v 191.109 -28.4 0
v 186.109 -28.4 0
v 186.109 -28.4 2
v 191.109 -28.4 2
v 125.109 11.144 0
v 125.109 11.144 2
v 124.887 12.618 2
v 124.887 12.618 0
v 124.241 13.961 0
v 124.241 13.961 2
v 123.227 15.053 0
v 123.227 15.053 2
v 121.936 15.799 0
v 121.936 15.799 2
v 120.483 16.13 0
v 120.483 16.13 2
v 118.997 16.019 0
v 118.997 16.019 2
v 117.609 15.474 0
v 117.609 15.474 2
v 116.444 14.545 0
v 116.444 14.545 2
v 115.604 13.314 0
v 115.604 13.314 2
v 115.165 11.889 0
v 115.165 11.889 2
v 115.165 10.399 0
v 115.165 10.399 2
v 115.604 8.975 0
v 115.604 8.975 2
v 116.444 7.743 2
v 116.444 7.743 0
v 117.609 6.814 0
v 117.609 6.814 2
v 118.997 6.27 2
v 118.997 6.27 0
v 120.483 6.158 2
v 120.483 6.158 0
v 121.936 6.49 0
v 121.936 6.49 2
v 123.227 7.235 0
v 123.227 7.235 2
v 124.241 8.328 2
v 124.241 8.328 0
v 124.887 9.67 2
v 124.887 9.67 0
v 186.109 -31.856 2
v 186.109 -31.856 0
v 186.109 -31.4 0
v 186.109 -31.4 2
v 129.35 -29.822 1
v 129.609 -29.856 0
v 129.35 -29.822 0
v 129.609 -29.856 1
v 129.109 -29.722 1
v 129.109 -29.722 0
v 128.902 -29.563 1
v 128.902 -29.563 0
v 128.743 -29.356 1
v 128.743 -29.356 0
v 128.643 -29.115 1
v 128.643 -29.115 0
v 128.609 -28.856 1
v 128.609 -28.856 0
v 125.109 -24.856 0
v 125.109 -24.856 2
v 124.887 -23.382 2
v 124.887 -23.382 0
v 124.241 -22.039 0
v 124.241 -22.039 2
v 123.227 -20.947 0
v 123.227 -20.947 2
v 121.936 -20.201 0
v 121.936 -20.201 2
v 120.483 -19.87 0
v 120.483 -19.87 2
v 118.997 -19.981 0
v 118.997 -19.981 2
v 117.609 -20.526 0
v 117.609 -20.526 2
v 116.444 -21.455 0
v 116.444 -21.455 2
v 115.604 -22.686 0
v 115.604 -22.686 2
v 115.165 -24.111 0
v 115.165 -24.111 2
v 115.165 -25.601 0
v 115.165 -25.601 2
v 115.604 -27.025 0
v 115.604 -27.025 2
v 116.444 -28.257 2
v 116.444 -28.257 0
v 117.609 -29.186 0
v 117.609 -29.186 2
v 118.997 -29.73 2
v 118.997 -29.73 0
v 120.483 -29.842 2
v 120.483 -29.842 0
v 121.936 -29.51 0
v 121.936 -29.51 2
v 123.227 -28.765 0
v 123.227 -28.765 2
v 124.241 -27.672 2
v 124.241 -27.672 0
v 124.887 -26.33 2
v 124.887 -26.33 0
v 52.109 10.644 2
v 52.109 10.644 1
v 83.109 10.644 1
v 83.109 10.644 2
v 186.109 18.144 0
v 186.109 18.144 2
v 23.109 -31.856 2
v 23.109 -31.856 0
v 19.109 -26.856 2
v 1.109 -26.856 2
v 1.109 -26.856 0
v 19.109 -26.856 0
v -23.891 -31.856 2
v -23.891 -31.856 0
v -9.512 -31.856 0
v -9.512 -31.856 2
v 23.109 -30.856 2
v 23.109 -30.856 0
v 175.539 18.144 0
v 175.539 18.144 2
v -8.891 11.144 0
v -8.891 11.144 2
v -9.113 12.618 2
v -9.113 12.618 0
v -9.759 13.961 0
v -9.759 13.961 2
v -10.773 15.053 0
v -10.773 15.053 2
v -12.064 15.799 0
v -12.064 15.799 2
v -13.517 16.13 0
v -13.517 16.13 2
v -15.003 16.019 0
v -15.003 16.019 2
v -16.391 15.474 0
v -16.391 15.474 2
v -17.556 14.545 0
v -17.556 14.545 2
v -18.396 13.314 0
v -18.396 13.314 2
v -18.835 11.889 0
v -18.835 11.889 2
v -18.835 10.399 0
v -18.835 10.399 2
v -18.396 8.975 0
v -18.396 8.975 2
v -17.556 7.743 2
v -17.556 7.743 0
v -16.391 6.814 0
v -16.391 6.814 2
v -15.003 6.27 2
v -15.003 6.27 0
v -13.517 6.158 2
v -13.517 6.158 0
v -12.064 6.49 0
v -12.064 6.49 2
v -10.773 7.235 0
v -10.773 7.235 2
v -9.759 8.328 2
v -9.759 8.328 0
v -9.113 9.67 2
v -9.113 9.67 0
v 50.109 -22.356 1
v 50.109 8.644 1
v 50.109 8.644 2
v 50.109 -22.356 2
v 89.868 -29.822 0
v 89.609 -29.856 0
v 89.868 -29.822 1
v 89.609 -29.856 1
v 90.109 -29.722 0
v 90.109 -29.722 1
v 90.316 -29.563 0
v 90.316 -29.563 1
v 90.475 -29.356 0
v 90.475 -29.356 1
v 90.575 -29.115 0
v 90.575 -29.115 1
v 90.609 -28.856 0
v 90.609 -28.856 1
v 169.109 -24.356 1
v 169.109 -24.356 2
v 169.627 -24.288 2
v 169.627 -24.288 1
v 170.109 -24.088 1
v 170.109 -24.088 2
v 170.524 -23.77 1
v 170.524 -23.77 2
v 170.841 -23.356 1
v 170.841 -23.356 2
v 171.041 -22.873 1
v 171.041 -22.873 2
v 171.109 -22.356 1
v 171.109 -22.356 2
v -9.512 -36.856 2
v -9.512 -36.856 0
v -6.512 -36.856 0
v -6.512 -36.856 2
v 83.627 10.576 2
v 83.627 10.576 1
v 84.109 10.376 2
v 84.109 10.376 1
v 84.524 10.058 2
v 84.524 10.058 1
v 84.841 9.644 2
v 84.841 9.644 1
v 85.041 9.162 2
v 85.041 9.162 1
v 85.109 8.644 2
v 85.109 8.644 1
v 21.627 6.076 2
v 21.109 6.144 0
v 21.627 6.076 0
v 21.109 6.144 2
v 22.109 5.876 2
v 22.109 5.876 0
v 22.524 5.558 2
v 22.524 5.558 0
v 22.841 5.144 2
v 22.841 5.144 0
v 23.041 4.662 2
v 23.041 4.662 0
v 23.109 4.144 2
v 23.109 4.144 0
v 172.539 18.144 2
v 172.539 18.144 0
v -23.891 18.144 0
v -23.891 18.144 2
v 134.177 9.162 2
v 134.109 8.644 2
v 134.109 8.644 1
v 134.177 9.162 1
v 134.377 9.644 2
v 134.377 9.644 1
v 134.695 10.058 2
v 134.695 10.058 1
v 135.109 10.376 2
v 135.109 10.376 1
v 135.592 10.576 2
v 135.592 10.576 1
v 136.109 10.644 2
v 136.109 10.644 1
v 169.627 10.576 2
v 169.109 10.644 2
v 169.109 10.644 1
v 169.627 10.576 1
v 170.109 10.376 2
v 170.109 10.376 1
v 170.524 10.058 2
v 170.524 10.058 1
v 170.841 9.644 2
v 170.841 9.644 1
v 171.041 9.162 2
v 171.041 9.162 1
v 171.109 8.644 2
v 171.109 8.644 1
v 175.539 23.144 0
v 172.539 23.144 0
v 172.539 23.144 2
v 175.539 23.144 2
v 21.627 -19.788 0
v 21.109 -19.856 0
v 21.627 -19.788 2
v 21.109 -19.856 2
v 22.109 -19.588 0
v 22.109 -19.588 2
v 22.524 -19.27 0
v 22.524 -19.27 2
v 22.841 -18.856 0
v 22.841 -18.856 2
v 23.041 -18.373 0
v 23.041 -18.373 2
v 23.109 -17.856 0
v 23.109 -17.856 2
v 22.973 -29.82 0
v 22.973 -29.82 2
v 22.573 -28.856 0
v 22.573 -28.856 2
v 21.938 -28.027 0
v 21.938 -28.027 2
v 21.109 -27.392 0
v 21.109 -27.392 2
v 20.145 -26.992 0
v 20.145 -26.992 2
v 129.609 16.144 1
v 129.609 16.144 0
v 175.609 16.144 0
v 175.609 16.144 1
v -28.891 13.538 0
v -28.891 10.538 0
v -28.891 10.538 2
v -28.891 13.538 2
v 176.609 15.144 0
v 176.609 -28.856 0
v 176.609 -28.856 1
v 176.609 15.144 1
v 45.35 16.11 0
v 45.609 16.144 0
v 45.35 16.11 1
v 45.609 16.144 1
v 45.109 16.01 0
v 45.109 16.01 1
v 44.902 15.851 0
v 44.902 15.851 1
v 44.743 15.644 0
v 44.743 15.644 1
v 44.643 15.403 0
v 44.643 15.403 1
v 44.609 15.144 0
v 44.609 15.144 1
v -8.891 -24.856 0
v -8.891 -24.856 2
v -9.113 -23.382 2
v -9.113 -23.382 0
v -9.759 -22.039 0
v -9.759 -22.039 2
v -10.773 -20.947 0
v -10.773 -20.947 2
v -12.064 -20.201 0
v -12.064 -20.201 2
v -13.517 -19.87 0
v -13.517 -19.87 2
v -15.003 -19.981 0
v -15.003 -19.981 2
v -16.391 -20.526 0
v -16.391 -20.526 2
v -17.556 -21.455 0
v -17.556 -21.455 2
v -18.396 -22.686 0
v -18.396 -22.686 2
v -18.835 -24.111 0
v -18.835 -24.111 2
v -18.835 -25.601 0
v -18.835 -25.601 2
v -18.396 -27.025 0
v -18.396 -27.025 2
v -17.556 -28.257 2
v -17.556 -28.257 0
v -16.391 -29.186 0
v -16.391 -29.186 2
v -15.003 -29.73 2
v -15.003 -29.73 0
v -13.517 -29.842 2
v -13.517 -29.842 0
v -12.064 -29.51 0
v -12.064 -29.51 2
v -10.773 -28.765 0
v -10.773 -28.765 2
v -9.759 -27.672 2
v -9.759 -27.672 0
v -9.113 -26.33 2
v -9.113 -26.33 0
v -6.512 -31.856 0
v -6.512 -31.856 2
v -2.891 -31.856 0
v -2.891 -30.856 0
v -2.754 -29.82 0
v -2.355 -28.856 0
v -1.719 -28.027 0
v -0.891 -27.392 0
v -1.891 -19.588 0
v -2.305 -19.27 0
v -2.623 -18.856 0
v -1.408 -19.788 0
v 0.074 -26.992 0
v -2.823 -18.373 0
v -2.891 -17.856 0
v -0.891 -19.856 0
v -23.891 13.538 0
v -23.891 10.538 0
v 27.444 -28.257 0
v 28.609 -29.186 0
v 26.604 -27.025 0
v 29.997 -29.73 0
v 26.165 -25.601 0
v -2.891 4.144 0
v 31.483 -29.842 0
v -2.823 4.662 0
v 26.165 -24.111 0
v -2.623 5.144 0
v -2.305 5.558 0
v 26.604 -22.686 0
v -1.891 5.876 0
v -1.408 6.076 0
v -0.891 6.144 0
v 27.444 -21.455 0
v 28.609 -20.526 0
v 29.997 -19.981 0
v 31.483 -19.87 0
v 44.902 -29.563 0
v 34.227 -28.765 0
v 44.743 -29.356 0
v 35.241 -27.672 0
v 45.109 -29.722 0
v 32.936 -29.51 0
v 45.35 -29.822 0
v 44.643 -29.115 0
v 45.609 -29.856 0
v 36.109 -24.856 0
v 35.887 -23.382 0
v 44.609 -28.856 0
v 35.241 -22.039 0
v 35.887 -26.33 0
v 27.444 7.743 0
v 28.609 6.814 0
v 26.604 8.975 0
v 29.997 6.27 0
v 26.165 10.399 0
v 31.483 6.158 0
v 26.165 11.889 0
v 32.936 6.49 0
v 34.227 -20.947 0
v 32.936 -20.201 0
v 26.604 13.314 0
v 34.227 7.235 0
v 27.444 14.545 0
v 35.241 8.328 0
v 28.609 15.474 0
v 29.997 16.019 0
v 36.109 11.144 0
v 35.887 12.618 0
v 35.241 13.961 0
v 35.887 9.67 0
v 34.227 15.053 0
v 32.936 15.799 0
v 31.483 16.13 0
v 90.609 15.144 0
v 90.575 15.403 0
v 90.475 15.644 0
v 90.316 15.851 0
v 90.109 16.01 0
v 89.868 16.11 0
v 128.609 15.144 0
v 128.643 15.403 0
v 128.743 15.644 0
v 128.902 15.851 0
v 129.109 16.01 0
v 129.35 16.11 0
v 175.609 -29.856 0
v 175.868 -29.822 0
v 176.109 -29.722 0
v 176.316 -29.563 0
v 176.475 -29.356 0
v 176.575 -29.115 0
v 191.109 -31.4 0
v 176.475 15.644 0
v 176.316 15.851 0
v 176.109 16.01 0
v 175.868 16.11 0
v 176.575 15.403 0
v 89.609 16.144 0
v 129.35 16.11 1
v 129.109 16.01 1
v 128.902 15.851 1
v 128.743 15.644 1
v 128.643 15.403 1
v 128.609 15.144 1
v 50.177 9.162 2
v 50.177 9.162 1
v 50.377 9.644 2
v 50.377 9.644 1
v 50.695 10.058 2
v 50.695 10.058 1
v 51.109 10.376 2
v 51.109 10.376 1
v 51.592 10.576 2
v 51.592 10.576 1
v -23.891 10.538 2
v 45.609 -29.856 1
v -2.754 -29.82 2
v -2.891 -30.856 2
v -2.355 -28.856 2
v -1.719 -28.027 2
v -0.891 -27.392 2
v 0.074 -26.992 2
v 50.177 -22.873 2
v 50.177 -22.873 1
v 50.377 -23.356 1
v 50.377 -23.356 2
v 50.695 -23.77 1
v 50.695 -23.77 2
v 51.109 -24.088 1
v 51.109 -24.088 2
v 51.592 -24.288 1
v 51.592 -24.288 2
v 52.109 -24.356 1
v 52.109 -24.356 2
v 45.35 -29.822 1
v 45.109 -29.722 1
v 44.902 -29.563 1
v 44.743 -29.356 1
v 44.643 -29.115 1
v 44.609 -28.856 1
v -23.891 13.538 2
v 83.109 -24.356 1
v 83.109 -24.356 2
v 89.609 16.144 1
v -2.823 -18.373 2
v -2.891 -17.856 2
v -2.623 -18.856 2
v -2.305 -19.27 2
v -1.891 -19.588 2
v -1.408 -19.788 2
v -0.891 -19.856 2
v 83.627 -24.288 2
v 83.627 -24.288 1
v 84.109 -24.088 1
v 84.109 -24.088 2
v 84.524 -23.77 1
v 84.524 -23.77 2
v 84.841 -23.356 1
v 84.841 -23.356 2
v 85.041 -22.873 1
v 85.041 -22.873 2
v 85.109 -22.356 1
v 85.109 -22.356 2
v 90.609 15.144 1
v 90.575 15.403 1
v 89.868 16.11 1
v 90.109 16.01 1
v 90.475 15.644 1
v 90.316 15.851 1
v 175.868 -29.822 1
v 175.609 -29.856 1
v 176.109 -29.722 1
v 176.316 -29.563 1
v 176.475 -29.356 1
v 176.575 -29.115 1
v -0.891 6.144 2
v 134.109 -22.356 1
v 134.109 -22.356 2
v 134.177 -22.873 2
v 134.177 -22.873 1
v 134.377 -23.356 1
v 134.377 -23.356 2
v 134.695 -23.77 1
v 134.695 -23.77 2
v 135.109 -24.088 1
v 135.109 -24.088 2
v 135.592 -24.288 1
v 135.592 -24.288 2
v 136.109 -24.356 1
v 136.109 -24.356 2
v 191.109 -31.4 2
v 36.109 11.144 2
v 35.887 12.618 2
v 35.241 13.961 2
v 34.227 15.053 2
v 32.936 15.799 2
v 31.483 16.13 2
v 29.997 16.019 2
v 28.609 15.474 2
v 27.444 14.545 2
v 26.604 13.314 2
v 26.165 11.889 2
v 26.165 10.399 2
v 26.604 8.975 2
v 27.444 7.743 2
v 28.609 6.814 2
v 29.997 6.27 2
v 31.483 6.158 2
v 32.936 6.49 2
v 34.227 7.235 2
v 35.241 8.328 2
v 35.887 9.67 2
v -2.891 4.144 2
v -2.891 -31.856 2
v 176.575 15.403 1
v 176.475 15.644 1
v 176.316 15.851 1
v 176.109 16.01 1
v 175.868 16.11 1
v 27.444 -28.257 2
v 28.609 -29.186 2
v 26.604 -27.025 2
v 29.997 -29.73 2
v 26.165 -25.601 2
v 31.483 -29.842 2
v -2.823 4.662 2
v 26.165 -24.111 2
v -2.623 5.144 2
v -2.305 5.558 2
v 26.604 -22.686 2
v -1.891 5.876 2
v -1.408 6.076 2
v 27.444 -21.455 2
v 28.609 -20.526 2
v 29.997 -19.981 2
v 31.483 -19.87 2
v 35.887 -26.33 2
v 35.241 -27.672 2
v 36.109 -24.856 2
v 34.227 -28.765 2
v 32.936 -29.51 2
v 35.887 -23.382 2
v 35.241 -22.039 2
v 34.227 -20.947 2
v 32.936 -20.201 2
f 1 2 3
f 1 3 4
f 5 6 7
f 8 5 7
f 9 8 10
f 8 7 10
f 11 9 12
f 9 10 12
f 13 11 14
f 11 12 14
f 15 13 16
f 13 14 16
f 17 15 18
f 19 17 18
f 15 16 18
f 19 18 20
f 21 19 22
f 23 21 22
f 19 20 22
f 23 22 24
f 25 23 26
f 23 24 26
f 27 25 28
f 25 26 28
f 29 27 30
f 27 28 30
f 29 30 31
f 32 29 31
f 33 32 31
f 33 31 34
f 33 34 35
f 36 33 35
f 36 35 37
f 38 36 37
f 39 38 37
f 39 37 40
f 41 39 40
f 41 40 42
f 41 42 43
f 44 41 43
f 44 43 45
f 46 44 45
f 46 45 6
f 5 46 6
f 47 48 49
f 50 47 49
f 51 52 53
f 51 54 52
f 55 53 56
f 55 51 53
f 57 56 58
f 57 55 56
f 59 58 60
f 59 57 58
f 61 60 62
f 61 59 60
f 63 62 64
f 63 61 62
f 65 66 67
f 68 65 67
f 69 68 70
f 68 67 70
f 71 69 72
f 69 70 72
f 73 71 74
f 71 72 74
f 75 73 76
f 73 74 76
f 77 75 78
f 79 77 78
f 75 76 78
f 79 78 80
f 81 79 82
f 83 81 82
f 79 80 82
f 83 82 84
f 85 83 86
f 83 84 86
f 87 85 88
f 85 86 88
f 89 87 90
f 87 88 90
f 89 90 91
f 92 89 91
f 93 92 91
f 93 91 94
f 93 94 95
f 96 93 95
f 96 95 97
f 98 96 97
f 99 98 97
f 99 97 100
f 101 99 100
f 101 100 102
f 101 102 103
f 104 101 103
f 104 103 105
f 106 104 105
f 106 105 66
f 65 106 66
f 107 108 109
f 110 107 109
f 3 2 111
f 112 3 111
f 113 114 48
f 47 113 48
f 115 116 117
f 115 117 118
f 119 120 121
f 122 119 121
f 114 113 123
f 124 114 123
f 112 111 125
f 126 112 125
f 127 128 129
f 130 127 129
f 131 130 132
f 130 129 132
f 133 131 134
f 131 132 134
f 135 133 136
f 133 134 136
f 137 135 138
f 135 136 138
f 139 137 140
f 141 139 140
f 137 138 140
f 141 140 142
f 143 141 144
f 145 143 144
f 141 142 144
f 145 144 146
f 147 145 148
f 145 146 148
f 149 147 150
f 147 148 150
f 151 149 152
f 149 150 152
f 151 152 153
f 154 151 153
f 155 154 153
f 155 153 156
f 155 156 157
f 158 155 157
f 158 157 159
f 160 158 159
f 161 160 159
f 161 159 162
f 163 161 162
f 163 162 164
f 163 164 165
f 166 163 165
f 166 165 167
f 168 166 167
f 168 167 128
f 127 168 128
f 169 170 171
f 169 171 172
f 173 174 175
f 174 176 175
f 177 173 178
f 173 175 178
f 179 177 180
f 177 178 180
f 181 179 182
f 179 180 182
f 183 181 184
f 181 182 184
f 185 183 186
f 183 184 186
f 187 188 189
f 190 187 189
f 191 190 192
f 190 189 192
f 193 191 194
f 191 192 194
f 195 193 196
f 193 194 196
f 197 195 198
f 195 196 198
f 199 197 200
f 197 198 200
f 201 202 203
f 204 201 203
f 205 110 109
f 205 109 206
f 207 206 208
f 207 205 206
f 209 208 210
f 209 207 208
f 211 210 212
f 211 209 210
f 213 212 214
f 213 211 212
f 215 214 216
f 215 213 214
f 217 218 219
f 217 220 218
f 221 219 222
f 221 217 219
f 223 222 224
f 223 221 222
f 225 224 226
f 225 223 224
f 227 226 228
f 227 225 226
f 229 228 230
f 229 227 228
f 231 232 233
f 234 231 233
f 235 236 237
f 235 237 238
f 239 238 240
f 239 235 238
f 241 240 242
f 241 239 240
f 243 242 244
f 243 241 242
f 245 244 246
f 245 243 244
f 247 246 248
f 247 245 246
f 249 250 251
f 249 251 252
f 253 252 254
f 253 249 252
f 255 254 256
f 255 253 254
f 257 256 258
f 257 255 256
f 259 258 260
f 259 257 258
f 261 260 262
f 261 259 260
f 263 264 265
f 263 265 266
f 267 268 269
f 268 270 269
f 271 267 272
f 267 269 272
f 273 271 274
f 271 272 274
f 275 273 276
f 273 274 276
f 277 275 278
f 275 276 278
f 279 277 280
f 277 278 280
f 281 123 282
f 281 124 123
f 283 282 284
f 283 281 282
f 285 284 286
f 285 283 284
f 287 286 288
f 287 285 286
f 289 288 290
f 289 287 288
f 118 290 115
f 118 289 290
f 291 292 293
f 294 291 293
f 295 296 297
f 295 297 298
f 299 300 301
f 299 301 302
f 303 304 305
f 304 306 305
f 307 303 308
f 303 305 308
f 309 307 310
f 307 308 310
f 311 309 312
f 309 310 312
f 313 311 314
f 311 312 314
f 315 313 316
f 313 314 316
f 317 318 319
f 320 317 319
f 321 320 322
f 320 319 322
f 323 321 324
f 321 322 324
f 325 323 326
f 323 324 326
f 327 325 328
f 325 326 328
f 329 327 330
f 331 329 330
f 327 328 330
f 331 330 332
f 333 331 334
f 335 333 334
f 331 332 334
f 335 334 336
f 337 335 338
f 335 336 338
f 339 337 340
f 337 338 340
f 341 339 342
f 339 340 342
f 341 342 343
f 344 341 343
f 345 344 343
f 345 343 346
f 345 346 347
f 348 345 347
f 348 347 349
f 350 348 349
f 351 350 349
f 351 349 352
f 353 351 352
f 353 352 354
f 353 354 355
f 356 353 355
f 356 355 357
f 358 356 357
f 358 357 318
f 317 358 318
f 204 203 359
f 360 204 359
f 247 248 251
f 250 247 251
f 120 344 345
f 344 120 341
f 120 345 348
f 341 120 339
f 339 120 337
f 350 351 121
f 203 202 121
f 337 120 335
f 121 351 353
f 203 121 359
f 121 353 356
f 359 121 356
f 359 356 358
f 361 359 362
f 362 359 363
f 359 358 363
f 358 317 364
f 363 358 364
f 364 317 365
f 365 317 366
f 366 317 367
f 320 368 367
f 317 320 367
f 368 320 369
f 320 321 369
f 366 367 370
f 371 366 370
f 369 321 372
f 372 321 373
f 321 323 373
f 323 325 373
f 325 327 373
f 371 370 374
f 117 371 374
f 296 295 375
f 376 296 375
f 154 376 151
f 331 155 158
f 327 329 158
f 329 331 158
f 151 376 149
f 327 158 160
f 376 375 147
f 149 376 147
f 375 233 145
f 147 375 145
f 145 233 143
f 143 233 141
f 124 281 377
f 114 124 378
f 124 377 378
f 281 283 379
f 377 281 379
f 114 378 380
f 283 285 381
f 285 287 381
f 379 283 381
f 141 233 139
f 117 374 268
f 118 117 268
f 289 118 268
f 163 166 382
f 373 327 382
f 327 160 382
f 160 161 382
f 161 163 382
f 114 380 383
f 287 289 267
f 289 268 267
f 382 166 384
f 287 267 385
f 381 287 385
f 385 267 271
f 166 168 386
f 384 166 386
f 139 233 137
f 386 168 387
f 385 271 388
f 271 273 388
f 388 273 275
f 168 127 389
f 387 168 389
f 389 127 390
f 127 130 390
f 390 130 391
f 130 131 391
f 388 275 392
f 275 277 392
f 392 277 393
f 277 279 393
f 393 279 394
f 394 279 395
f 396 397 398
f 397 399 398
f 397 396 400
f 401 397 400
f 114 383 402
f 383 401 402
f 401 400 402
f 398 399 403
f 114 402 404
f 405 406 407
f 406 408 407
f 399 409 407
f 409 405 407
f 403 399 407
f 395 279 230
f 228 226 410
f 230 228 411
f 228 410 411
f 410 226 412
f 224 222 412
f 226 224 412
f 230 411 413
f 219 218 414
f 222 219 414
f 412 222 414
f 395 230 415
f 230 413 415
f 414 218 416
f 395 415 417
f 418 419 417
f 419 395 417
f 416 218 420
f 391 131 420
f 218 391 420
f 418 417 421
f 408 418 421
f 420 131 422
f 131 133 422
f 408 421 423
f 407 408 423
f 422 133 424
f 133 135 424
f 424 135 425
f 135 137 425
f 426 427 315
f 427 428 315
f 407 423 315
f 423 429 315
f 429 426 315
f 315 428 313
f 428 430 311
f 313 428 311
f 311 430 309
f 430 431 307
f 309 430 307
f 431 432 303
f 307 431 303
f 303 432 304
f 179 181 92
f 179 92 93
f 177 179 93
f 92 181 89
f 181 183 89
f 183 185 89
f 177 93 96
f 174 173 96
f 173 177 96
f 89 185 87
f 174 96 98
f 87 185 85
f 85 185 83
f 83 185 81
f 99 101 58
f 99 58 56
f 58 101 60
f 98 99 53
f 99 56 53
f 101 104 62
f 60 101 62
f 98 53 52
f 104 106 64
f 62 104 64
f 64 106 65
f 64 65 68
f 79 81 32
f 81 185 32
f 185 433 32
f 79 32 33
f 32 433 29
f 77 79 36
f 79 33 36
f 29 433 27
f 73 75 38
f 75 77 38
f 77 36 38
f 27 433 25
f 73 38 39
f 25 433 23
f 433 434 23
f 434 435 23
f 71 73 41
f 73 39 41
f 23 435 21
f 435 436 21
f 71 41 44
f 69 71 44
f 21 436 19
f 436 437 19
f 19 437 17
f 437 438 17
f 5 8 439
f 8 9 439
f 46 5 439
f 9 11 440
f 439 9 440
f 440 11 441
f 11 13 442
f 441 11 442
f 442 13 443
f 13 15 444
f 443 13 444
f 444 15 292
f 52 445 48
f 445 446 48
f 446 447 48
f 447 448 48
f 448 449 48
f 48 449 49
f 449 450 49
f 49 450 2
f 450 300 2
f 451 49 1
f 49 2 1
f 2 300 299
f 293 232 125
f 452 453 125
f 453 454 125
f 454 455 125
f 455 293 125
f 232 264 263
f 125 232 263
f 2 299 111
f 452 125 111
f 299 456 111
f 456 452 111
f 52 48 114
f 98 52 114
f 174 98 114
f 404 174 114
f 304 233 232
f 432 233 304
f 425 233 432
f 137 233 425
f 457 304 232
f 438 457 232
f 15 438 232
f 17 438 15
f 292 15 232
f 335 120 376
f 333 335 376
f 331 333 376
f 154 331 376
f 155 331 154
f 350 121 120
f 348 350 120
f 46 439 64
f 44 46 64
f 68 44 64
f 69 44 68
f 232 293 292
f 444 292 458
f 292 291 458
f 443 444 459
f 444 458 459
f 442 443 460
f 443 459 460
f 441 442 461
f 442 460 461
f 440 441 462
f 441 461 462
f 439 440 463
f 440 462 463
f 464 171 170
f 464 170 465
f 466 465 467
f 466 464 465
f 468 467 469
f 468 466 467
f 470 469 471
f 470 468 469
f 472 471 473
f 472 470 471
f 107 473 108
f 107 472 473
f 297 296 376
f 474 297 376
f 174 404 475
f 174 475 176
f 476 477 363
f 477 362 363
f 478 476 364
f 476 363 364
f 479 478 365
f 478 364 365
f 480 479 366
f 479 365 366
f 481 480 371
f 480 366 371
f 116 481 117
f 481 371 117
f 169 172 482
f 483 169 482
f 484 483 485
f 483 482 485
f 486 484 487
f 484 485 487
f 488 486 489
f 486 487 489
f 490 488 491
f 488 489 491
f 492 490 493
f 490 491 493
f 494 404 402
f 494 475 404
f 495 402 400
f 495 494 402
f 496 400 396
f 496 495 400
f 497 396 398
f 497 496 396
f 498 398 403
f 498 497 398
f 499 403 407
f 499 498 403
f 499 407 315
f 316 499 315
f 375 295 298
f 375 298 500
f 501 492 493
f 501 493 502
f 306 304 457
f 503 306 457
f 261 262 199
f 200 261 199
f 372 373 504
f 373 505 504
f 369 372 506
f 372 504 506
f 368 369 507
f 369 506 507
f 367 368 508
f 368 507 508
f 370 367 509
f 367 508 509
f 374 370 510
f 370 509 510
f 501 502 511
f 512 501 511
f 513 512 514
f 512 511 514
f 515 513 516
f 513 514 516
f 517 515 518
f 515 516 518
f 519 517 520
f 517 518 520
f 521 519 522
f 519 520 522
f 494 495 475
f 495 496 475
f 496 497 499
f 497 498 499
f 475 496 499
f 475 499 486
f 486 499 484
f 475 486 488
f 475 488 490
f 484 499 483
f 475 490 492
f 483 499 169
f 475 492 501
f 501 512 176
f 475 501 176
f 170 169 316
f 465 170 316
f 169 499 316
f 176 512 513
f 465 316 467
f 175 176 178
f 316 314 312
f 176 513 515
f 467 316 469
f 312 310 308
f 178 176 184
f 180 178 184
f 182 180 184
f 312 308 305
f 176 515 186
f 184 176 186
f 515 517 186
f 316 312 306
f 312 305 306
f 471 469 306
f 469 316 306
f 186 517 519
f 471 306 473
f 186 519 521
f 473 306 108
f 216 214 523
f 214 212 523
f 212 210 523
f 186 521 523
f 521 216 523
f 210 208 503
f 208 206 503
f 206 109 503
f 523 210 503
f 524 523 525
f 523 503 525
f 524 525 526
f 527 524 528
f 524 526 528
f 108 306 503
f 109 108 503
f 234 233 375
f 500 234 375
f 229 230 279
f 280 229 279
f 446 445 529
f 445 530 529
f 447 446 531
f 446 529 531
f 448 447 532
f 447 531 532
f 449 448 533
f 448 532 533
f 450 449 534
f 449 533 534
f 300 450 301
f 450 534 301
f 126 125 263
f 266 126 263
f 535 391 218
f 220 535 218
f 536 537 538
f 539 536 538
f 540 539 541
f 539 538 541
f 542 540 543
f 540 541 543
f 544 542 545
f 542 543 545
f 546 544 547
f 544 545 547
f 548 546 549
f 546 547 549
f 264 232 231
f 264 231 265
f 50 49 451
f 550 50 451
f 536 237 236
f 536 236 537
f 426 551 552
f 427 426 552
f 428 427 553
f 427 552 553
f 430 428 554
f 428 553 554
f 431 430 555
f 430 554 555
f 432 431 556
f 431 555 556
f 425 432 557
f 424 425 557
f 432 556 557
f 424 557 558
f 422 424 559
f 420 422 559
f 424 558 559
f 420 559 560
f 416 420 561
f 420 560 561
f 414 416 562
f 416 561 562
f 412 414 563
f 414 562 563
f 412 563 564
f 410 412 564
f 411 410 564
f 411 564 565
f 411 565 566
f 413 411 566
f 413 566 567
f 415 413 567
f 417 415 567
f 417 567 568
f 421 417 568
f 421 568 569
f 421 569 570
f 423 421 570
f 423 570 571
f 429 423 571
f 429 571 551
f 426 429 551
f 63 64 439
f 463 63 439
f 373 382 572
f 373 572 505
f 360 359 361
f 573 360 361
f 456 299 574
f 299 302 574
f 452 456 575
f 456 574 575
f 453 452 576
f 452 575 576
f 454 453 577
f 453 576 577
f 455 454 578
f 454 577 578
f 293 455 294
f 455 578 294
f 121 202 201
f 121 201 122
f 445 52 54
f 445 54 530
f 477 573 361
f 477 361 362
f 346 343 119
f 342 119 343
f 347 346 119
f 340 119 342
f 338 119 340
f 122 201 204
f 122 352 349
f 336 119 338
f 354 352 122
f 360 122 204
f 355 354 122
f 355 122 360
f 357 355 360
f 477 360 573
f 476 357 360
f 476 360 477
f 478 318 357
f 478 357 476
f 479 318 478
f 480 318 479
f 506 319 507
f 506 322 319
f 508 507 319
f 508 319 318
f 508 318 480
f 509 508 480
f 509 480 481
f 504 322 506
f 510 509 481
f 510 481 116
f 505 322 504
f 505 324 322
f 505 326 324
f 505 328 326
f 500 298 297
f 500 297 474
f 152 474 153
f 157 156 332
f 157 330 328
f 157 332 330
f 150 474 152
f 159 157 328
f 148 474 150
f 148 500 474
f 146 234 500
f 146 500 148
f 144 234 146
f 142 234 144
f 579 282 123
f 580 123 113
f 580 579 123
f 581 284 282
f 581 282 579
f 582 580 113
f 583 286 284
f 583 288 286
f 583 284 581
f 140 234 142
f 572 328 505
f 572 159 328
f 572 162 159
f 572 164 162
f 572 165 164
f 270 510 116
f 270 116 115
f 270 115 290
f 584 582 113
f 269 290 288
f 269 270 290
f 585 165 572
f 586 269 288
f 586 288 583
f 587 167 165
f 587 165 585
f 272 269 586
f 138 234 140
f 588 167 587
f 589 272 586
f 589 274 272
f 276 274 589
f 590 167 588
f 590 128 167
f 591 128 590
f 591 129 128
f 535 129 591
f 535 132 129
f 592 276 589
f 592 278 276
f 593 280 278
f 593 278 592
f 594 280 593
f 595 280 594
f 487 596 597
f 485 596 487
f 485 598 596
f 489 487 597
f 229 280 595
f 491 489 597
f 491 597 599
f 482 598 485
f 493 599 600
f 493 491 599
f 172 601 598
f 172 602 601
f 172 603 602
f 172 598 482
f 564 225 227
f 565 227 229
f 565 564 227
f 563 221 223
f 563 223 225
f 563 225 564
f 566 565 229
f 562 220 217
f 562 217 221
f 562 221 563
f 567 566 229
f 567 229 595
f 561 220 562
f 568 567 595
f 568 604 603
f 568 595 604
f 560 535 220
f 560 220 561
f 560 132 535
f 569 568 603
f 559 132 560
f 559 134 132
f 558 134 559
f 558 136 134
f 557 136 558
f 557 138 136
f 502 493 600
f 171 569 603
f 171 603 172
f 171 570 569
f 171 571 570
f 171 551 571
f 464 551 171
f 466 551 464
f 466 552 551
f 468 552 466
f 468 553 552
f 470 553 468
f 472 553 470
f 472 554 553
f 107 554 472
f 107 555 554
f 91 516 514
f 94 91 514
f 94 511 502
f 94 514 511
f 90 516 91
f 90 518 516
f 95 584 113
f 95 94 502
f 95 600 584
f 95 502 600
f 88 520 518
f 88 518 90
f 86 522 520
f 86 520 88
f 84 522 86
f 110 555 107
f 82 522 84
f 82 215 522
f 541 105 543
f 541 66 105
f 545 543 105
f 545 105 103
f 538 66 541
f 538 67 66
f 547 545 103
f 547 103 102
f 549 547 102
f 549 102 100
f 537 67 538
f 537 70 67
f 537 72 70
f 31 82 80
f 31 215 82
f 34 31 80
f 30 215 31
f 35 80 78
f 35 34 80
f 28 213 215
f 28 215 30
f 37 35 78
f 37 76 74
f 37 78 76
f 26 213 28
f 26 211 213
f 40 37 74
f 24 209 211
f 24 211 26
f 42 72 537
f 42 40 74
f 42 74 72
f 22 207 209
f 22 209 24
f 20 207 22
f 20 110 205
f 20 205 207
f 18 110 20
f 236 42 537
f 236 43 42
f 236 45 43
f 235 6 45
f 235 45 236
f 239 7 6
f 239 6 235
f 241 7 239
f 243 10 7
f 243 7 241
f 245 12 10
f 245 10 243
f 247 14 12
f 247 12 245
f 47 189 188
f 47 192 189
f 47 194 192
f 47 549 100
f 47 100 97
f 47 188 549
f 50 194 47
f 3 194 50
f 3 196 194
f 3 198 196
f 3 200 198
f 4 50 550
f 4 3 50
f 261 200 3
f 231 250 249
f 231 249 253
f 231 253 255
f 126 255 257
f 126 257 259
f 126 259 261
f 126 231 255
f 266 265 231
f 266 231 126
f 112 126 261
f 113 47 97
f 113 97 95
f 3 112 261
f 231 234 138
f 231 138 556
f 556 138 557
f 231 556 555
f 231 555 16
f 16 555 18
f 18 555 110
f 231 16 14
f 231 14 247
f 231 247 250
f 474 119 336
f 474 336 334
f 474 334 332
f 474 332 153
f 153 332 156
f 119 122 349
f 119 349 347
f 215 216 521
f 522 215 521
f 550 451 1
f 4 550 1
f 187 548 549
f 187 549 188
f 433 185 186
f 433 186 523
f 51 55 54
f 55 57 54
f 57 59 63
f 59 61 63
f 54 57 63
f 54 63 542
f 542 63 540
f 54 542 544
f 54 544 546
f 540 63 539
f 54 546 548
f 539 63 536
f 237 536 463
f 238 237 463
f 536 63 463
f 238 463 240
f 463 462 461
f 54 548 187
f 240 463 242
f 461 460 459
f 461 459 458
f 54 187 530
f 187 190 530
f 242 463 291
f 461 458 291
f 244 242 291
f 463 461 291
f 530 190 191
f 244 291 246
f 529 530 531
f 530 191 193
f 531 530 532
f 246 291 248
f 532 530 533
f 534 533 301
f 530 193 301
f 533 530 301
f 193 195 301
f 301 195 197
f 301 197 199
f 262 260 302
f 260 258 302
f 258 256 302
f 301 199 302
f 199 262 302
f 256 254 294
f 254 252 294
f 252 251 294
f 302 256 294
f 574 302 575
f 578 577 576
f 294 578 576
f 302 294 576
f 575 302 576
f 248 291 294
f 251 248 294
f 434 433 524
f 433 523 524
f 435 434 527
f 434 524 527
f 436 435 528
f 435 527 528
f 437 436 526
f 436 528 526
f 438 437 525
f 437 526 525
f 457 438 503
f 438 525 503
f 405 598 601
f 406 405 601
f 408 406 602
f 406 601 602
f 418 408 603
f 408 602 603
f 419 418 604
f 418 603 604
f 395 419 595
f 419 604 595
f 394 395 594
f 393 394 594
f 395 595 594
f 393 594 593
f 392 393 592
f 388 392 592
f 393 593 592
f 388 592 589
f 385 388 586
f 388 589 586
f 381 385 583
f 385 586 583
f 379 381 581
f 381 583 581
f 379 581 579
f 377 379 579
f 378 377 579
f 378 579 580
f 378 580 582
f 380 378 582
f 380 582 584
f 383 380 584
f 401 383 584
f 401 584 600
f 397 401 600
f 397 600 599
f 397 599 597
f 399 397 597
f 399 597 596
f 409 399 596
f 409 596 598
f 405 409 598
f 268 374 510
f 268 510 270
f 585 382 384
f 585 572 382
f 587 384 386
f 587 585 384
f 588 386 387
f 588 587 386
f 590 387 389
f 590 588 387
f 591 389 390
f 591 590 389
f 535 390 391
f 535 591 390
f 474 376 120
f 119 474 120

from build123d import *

# Parameters (mm, degrees)
F1_DEPTH  = 2
F2_W      = 26
F2_H      = 26
F3_DEPTH  = 15.4
F4_W      = 35
F4_H      = 35
F4_W_2    = 37
F5_DEPTH  = 25
F6_W      = 26
F6_H      = 5
F7_DEPTH  = 25
F8_R      = 4
F9_R      = 2
F10_R     = 5
F11_DEPTH = 25
F12_R     = 5
F13_DEPTH = 25
F14_W     = 46
F14_H     = 46
F14_W_2   = 48
F15_DEPTH = 1
F16_R     = 1
F17_R     = 1
F0_W      = 5
F0_H      = 3
F0_W_2    = 3
F0_H_2    = 5
F18_DEPTH = 2


# Not quite as in the source:
# - a feature names something its author has since deleted; it is built from what else it names


with BuildPart() as f1:
    # F0 (on Top) → F1 (new body)
    with BuildSketch(Plane.XY):
        Polygon((172.5389735401, 18.1442317292), (-23.8906879723, 18.1442317292), (-23.8906879723, 13.5384923518), (-23.8906879723, 10.5384923518), (-23.8906879723, -31.8557682708), (-9.5117332786, -31.8557682708), (-6.5117332786, -31.8557682708), (186.1093120277, -31.8557682708), (186.1093120277, -31.4002893865), (186.1093120277, -28.4002893865), (186.1093120277, 18.1442317292), (175.5389735401, 18.1442317292), align=None)
    extrude(amount=F1_DEPTH)

    # F2 (on face) → F3 (cut)
    with BuildSketch(Plane(origin=(0, 0, 0), x_dir=(1, 0, 0), z_dir=(0, 0, -1))):
        with Locations((10.1093120277, 6.8557682708)):
            Rectangle(F2_W, F2_H)
    extrude(amount=-F3_DEPTH, mode=Mode.SUBTRACT)

    # F4 (on face) → F5 (cut)
    with BuildSketch(Plane(origin=(0, 0, 0), x_dir=(1, 0, 0), z_dir=(0, 0, -1))):
        with Locations((67.6093120277, 6.8557682708)):
            Rectangle(F4_W, F4_H)
        with Locations((152.6093120277, 6.8557682708)):
            Rectangle(F4_W_2, F4_H)
    extrude(amount=-F5_DEPTH, mode=Mode.SUBTRACT)

    # F6 (on face) → F7 (cut)
    with BuildSketch(Plane.XY.offset(2)):
        with Locations((10.1093120277, -29.3557682708)):
            Rectangle(F6_W, F6_H)
    extrude(amount=-F7_DEPTH, mode=Mode.SUBTRACT)

    # F8
    f8_edges = [f1.edges().sort_by_distance(p)[0] for p in [
        (-2.890688, -26.855768, 1),
        (23.109312, -26.855768, 1),
    ]]
    fillet(f8_edges, radius=F8_R)

    # F9
    f9_edges = [f1.edges().sort_by_distance(p)[0] for p in [
        (50.109312, 10.644232, 1),
        (85.109312, 10.644232, 1),
        (50.109312, -24.355768, 1),
        (134.109312, -24.355768, 1),
        (85.109312, -24.355768, 1),
        (171.109312, -24.355768, 1),
        (134.109312, 10.644232, 1),
        (171.109312, 10.644232, 1),
        (23.109312, 6.144232, 1),
        (-2.890688, 6.144232, 1),
        (23.109312, -19.855768, 1),
        (-2.890688, -19.855768, 1),
    ]]
    fillet(f9_edges, radius=F9_R)

    # F10 (on face) → F11 (cut)
    with BuildSketch(Plane.XY.offset(2)):
        with Locations((120.1093120277, 11.1442317292)):
            Circle(F10_R)
        with Locations((120.1093120277, -24.8557682708)):
            Circle(F10_R)
        with Locations((31.1093120277, -24.8557682708)):
            Circle(F10_R)
        with Locations((-13.8906879723, 11.1442317292)):
            Circle(F10_R)
        with Locations((-13.8906879723, -24.8557682708)):
            Circle(F10_R)
    extrude(amount=-F11_DEPTH, mode=Mode.SUBTRACT)

    # F12 (on face) → F13 (cut)
    with BuildSketch(Plane.XY.offset(2)):
        with Locations((31.1093120277, 11.1442317292)):
            Circle(F12_R)
    extrude(amount=-F13_DEPTH, mode=Mode.SUBTRACT)

    # F14 (on face) → F15 (cut)
    with BuildSketch(Plane.XY):
        with Locations((67.6093120277, -6.8557682708)):
            Rectangle(F14_W, F14_H)
        with Locations((152.6093120277, -6.8557682708)):
            Rectangle(F14_W_2, F14_H)
    extrude(amount=F15_DEPTH, mode=Mode.SUBTRACT)

    # F16
    f16_edges = [f1.edges().sort_by_distance(p)[0] for p in [
        (44.609312, -29.855768, 0.5),
        (90.609312, -29.855768, 0.5),
        (90.609312, 16.144232, 0.5),
        (44.609312, 16.144232, 0.5),
    ]]
    fillet(f16_edges, radius=F16_R)

    # F17
    f17_edges = [f1.edges().sort_by_distance(p)[0] for p in [
        (128.609312, -29.855768, 0.5),
        (176.609312, -29.855768, 0.5),
        (176.609312, 16.144232, 0.5),
        (128.609312, 16.144232, 0.5),
    ]]
    fillet(f17_edges, radius=F17_R)

    # F0 (on Top) → F18 (join)
    with BuildSketch(Plane.XY):
        with Locations((188.6093120277, -29.9002893865)):
            Rectangle(F0_W, F0_H)
        with Locations((174.0389735401, 20.6442317292)):
            Rectangle(F0_W_2, F0_H_2)
        with Locations((-8.0117332786, -34.3557682708)):
            Rectangle(F0_W_2, F0_H_2)
        with Locations((-26.3906879723, 12.0384923518)):
            Rectangle(F0_W, F0_H)
    extrude(amount=F18_DEPTH)


solid = f1.part
